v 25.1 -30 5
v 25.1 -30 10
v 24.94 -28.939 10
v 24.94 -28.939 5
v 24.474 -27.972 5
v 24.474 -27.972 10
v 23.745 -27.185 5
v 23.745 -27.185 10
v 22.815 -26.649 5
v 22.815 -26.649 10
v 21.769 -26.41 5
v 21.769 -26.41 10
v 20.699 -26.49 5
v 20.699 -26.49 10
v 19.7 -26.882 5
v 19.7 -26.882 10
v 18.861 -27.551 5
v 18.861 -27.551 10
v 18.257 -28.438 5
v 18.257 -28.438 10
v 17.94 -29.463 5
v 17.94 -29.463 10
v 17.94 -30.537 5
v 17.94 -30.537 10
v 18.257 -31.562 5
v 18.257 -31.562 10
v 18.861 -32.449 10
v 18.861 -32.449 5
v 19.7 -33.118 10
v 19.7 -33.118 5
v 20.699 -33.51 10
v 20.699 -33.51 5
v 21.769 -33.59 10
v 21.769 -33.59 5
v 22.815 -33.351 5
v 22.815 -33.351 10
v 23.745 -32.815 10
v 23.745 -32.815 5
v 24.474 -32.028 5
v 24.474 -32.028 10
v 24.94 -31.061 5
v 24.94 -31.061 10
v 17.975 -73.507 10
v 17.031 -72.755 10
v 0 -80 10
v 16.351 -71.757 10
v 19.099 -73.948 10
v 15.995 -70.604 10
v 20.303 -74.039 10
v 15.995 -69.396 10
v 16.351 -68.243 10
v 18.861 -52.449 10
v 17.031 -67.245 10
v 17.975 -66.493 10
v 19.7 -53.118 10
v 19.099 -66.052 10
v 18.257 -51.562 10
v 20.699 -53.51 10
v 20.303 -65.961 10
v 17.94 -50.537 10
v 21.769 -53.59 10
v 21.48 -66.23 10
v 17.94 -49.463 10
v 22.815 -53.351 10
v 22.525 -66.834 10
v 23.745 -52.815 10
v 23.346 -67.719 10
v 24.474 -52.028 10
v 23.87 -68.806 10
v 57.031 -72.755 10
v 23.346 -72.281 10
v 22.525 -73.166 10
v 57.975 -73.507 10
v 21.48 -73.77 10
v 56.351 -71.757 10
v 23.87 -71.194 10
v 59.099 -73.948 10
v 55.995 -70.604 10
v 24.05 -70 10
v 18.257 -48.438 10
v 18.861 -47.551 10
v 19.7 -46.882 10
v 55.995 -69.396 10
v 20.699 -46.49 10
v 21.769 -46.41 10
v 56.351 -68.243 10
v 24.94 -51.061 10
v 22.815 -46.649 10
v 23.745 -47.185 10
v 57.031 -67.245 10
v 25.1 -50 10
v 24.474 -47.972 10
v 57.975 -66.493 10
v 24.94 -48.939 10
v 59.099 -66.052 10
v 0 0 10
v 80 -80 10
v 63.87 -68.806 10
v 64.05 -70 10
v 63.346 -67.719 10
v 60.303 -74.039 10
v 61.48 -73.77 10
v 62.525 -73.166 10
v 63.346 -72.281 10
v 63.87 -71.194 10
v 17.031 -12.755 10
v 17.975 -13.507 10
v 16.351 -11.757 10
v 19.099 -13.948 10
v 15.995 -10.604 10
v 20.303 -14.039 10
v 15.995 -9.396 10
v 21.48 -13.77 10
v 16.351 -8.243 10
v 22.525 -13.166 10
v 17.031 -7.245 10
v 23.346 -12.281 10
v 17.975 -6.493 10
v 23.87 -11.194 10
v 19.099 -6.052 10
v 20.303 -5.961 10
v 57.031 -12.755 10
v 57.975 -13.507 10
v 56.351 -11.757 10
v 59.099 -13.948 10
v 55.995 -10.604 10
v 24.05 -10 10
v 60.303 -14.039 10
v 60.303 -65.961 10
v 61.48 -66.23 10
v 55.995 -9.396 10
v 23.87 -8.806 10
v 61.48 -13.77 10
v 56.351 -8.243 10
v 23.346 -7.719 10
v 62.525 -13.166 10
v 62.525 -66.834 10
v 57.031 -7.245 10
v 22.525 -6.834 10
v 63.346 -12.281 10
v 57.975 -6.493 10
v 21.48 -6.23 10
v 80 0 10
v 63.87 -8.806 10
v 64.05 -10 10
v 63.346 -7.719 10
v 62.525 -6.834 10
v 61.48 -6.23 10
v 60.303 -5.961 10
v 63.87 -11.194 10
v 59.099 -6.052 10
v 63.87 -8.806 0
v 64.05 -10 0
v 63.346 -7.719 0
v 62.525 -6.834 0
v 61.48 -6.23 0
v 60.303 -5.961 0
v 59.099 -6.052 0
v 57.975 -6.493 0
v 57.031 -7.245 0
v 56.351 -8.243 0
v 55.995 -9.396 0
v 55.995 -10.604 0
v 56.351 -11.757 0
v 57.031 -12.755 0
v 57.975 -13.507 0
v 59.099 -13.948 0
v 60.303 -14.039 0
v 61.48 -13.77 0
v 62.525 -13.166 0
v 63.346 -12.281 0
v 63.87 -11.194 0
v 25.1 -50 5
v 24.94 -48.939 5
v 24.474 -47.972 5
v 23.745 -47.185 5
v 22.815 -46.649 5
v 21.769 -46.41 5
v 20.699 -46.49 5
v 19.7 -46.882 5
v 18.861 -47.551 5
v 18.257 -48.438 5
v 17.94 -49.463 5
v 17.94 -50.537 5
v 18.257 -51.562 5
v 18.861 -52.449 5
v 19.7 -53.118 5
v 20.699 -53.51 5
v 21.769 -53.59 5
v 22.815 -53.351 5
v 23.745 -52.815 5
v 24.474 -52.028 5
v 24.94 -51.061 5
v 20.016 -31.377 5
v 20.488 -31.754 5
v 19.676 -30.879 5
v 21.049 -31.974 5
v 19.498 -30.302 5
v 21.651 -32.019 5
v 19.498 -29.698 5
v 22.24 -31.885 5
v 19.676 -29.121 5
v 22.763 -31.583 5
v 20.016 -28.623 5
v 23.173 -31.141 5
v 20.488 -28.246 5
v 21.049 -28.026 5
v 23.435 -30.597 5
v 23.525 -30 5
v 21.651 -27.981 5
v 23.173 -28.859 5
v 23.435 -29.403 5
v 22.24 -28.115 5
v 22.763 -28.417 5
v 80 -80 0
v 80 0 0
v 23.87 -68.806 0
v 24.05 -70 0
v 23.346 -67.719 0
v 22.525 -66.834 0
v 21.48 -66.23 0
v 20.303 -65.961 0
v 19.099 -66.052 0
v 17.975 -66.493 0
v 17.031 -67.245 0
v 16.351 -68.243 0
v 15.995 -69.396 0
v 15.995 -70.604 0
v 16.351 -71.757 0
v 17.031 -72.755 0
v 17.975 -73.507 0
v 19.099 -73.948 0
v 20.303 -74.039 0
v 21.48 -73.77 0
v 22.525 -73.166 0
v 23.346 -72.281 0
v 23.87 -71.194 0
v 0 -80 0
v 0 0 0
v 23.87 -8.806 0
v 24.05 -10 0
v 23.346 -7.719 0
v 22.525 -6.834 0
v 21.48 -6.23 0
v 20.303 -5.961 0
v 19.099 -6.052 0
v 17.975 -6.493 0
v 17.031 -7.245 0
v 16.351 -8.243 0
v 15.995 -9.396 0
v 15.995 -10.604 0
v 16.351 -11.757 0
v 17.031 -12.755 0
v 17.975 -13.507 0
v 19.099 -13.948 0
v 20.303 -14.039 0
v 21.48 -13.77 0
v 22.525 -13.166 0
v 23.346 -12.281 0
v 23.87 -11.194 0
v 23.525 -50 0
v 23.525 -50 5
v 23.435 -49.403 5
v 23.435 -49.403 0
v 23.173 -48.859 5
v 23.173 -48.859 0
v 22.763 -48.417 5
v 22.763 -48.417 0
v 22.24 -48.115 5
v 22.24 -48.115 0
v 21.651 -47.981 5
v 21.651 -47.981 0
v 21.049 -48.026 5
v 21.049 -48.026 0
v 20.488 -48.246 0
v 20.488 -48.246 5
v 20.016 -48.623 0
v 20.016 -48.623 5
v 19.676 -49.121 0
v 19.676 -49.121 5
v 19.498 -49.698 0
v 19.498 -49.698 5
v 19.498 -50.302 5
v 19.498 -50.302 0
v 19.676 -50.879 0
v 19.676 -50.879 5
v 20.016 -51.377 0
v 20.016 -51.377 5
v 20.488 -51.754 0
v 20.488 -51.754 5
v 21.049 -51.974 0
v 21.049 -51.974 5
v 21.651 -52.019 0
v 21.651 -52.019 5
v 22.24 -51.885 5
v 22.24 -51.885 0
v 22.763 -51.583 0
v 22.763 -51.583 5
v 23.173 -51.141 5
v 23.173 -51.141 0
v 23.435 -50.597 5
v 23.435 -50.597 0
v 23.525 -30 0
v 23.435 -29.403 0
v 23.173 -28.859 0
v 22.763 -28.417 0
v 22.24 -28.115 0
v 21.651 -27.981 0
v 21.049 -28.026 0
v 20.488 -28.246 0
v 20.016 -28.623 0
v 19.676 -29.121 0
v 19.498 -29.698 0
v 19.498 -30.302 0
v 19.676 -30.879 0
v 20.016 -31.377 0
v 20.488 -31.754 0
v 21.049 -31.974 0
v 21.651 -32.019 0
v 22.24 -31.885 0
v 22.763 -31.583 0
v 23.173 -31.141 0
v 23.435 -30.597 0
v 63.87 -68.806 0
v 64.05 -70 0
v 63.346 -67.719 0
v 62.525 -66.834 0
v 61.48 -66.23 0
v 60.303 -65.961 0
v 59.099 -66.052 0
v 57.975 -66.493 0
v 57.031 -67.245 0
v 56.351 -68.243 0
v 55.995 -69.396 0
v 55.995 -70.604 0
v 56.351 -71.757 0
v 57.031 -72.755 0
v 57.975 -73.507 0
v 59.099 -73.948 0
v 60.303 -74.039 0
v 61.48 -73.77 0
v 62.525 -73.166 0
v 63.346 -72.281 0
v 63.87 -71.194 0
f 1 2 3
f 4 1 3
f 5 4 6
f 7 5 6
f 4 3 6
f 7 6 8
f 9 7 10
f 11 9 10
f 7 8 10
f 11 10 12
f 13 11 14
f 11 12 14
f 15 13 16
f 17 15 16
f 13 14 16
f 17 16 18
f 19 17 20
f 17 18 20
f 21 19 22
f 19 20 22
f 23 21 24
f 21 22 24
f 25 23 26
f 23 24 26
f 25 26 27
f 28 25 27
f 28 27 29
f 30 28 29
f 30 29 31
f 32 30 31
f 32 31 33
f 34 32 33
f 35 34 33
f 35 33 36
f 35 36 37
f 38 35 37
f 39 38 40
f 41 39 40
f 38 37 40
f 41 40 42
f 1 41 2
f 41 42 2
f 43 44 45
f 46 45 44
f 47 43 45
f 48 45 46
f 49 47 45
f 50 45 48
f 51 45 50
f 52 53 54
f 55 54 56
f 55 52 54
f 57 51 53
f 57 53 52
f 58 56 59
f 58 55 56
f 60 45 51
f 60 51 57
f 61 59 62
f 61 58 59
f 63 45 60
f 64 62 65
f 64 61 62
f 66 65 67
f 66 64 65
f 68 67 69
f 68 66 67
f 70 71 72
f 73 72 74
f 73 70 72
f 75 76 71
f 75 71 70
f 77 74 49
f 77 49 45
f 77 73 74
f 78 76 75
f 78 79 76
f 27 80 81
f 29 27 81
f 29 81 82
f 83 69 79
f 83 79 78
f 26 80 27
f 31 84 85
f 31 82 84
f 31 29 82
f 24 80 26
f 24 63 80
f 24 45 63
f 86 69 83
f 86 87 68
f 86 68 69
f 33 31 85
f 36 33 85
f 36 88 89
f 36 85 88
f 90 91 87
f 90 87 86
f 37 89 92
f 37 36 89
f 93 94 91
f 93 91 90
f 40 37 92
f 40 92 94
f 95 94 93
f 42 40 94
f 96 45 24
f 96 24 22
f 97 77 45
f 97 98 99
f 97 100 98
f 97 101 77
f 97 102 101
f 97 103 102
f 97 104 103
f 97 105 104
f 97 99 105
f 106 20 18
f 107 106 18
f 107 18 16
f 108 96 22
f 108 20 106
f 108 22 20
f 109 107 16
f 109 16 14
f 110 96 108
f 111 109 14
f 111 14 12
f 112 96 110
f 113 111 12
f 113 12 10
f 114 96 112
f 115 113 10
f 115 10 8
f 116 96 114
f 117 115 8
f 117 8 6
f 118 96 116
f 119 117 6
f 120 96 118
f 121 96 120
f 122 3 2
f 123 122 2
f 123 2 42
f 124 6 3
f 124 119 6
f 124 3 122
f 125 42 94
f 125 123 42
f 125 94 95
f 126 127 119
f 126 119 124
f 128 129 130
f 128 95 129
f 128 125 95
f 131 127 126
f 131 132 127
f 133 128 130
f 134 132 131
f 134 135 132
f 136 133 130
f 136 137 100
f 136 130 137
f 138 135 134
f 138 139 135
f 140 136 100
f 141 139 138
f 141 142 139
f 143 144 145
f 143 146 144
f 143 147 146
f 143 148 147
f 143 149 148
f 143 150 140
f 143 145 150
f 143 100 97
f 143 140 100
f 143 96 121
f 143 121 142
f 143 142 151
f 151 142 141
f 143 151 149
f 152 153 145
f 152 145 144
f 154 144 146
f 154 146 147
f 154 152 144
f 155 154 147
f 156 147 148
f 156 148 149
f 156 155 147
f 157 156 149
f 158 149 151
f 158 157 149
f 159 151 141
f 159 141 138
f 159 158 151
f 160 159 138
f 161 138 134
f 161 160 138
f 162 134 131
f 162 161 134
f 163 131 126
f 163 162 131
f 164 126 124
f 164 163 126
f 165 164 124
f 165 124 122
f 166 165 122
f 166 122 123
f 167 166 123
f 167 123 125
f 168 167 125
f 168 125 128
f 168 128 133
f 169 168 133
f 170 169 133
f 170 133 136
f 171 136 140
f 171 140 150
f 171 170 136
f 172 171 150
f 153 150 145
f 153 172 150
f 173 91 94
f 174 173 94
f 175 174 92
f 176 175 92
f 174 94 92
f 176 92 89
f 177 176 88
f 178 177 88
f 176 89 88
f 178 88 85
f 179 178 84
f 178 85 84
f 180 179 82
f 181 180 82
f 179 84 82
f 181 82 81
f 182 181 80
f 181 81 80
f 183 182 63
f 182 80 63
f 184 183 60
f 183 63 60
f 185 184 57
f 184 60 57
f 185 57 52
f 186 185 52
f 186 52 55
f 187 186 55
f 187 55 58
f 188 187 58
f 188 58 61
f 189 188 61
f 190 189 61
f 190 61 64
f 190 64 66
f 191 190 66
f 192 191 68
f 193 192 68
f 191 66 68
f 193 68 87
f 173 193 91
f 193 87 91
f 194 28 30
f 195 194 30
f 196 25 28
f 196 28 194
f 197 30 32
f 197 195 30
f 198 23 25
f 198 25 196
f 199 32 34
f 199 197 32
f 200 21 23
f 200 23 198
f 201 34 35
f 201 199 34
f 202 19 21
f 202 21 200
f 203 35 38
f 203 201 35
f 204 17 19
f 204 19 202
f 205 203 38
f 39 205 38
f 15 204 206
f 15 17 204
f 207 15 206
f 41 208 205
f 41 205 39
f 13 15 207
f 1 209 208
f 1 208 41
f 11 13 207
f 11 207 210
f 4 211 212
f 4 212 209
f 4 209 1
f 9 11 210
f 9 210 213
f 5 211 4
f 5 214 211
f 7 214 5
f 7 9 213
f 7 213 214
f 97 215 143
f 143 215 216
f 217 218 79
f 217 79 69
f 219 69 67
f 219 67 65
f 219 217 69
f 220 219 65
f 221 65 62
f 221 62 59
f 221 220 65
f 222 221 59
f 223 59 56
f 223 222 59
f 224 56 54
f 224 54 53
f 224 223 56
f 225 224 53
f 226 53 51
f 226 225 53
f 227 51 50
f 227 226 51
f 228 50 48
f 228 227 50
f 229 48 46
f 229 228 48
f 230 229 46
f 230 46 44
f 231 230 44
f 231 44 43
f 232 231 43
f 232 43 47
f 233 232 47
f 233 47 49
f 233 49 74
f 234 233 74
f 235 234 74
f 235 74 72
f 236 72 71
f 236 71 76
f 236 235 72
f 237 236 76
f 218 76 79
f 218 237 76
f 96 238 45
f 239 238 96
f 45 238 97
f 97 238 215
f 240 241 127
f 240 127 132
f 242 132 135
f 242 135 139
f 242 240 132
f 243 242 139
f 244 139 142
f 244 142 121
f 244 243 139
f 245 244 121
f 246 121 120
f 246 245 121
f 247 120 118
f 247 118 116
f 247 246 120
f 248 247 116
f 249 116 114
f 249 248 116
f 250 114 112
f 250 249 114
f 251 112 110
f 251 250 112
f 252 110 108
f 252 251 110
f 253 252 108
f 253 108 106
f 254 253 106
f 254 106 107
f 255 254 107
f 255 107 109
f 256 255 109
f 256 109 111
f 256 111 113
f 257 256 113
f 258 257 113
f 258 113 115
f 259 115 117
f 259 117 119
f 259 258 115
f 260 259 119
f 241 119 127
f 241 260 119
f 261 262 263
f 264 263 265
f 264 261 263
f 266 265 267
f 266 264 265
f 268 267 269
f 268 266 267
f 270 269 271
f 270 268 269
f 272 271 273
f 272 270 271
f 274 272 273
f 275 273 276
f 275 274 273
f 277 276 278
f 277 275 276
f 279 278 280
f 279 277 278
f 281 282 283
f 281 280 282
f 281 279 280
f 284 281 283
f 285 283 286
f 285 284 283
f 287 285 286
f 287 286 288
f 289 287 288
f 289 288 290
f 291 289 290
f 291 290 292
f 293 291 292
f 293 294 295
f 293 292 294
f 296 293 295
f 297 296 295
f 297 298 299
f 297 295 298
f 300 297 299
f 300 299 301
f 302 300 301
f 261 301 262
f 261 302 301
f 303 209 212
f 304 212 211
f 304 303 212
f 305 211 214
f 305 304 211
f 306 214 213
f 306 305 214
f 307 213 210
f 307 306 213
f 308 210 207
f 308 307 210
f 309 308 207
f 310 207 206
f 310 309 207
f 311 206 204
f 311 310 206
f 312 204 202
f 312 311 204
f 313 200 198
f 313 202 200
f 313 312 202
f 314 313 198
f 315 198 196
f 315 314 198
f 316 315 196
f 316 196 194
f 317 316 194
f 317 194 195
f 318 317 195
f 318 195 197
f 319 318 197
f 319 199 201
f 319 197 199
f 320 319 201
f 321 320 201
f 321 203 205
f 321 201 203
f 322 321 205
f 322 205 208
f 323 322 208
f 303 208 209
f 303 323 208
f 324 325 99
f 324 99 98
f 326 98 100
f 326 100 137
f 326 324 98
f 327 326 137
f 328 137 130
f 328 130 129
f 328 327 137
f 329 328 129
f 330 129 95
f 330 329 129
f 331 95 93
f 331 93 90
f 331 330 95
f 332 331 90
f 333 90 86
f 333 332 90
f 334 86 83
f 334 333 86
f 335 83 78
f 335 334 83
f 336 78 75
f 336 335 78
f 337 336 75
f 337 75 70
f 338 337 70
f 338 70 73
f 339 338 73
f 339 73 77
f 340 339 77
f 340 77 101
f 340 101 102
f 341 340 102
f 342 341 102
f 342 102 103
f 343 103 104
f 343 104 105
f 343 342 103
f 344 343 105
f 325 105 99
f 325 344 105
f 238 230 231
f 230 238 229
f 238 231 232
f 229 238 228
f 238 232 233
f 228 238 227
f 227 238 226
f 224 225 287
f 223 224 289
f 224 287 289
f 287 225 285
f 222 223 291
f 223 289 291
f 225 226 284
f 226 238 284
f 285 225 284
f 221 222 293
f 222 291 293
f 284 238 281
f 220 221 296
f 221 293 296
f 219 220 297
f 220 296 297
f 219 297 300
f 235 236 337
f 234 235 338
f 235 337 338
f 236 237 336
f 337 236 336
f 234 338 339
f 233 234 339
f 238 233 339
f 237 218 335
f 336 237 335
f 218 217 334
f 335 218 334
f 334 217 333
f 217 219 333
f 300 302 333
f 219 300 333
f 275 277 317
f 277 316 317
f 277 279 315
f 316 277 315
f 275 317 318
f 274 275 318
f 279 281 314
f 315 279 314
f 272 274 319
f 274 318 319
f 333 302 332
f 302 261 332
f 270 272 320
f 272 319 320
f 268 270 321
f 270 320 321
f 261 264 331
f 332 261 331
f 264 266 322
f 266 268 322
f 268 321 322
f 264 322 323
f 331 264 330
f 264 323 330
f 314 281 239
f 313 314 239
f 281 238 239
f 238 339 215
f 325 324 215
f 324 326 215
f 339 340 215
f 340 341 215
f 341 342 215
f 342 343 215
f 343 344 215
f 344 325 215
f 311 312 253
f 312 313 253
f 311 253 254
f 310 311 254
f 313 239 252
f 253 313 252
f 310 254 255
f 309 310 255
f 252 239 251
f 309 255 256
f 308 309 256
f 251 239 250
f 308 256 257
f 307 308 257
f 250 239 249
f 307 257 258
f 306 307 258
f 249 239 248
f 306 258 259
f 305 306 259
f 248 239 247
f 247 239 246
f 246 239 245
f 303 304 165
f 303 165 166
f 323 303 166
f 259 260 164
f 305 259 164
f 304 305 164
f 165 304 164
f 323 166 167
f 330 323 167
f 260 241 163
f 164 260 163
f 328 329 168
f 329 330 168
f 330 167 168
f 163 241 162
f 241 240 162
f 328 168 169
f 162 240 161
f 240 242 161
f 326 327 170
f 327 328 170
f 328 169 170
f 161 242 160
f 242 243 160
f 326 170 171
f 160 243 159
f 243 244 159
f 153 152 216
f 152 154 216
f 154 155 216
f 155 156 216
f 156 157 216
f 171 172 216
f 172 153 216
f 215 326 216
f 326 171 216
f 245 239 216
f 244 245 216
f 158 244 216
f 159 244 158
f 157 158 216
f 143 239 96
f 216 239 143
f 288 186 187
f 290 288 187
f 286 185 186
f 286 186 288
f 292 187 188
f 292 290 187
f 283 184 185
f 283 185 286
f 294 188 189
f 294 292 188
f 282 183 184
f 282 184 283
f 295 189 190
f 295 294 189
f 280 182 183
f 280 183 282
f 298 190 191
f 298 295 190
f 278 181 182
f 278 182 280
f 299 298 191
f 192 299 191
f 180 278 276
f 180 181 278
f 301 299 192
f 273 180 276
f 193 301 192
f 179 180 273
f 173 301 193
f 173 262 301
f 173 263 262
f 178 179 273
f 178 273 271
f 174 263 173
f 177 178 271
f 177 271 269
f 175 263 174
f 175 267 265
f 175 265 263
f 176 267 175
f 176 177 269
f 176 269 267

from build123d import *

# Parameters (mm, degrees)
F0_W     = 80
F0_H     = 80
F0_R     = 4.05
F0_R_2   = 2.025
F1_DEPTH = 10
F2_R     = 3.6
F3_DEPTH = 5


with BuildPart() as f1:
    # F0 (on Top) → F1 (new body)
    with BuildSketch(Plane.XY):
        with Locations((40, -40)):
            Rectangle(F0_W, F0_H)
        with Locations((20, -70)):
            Circle(F0_R, mode=Mode.SUBTRACT)
        with Locations((21.5, -50)):
            Circle(F0_R_2, mode=Mode.SUBTRACT)
        with Locations((60, -70)):
            Circle(F0_R, mode=Mode.SUBTRACT)
        with Locations((21.5, -30)):
            Circle(F0_R_2, mode=Mode.SUBTRACT)
        with Locations((20, -10)):
            Circle(F0_R, mode=Mode.SUBTRACT)
        with Locations((60, -10)):
            Circle(F0_R, mode=Mode.SUBTRACT)
    extrude(amount=F1_DEPTH)

    # F2 (on face) → F3 (cut)
    with BuildSketch(Plane.XY.offset(10)):
        with Locations((21.5, -30)):
            Circle(F2_R)
        with Locations((21.5, -50)):
            Circle(F2_R)
    extrude(amount=-F3_DEPTH, mode=Mode.SUBTRACT)


solid = f1.part
